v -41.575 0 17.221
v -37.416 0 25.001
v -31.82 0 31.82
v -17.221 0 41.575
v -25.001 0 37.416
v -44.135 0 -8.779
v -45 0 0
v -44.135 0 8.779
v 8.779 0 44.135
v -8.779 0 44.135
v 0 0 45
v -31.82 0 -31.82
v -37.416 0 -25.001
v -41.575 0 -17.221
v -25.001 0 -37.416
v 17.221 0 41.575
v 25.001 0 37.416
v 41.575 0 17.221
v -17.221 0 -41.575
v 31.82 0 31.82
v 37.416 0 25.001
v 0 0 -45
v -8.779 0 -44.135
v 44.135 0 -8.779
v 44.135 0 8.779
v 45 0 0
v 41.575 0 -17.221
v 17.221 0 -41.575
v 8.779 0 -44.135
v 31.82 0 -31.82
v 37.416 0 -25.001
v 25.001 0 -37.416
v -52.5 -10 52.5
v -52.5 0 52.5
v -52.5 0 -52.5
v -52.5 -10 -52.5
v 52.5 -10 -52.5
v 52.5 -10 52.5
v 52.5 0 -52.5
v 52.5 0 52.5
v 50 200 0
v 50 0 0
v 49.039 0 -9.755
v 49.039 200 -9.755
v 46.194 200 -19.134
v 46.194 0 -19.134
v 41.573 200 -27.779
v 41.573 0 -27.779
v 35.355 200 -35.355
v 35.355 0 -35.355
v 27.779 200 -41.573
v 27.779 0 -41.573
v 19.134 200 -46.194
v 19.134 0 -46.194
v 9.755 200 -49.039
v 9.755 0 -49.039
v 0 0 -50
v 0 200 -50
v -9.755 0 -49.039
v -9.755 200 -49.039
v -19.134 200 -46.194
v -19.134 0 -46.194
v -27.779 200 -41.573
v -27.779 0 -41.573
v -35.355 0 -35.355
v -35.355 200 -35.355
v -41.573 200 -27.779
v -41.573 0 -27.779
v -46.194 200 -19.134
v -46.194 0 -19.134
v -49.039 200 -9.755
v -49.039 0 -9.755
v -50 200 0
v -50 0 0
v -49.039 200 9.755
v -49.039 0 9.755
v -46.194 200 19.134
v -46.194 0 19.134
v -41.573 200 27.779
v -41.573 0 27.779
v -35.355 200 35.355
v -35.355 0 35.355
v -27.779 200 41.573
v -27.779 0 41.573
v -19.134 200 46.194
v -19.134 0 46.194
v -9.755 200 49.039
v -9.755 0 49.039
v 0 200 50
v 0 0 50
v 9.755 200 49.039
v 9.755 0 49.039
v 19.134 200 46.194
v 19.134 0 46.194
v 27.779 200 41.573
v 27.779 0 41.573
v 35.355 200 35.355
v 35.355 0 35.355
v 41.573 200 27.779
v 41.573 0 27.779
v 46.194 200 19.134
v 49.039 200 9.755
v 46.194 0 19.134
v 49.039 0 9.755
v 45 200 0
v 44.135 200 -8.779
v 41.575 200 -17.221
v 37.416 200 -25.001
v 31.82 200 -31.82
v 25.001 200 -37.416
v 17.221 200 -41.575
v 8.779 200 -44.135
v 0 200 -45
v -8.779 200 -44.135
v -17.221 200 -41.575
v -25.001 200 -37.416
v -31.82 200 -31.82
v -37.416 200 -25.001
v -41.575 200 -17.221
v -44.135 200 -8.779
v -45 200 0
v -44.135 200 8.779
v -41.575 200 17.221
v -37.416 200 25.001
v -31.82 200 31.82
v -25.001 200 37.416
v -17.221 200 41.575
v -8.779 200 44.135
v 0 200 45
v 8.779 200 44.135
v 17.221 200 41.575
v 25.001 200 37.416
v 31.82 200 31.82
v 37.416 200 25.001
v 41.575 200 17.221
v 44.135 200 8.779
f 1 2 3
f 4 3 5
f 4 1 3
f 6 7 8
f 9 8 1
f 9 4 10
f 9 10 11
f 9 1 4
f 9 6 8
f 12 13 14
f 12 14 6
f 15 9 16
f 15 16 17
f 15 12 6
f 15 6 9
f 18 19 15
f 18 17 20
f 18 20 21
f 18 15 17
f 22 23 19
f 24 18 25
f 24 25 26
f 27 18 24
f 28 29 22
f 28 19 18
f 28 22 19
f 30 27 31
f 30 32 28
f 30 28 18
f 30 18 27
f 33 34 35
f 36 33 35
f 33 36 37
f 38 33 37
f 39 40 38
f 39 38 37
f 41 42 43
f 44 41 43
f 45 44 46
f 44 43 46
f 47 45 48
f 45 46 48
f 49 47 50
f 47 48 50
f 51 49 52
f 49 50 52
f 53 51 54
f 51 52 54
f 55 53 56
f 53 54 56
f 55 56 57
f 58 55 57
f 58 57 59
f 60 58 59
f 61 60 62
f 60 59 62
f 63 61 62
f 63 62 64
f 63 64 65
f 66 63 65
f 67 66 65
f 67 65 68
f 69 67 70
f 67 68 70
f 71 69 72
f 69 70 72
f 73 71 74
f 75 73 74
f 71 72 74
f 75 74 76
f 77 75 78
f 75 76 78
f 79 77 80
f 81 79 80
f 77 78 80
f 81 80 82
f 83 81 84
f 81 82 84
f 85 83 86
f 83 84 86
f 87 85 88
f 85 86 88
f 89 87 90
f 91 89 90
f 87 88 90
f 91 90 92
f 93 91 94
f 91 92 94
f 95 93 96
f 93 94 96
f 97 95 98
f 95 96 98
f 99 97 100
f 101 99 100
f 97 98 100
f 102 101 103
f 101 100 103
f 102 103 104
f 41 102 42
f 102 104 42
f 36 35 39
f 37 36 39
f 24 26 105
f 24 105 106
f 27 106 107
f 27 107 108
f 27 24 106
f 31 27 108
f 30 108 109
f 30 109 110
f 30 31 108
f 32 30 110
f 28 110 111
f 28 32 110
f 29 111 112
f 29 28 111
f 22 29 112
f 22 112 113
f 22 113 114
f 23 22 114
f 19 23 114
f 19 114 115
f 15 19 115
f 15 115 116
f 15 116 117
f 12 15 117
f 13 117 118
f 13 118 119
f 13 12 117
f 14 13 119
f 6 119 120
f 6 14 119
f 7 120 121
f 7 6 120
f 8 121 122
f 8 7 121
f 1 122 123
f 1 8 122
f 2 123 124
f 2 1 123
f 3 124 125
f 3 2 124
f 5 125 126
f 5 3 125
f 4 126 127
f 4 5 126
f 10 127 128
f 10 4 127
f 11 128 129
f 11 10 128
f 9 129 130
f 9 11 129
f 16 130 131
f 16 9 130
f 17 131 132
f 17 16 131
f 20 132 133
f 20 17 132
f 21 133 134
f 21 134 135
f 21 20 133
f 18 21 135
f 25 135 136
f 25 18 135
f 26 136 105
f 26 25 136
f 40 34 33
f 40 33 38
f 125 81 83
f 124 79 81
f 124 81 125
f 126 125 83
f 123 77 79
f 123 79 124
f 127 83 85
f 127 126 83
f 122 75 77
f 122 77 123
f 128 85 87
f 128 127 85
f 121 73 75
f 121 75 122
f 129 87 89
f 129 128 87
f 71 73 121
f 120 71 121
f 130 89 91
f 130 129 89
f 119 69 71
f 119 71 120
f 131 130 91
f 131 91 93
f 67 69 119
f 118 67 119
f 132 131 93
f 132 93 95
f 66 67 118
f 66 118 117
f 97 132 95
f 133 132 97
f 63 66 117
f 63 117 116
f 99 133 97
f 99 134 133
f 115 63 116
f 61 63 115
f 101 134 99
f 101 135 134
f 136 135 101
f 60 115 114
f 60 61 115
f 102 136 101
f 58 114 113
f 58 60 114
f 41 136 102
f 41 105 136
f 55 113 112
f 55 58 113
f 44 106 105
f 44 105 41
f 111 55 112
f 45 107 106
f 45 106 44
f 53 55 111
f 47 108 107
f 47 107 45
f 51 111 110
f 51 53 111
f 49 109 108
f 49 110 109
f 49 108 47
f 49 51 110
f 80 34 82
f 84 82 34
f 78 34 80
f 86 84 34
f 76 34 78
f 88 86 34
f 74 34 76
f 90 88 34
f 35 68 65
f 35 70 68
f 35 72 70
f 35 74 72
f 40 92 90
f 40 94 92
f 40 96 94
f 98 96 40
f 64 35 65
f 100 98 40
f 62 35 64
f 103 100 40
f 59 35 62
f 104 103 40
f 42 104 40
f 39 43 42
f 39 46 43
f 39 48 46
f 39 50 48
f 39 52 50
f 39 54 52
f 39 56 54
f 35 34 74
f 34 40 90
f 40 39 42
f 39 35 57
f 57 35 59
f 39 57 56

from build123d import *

# Parameters (mm, degrees)
SKETCH2_R           = 50
SKETCH2_R_2         = 45
BOSS_EXTRUDE3_DEPTH = 200
SKETCH4_W           = 105
SKETCH4_H           = 105
BOSS_EXTRUDE5_DEPTH = 10


with BuildPart() as part:
    # Sketch2 → Boss-Extrude3 (new body)
    with BuildSketch(Plane(origin=(0, 0, 0), x_dir=(1, 0, 0), z_dir=(0, 1, 0))):
        Circle(SKETCH2_R)
        Circle(SKETCH2_R_2, mode=Mode.SUBTRACT)
    extrude(amount=BOSS_EXTRUDE3_DEPTH)

    # Sketch4 → Boss-Extrude5 (add)
    with BuildSketch(Plane(origin=(0, 0, 0), x_dir=(1, 0, 0), z_dir=(0, 1, 0))):
        Rectangle(SKETCH4_W, SKETCH4_H)
    extrude(amount=-BOSS_EXTRUDE5_DEPTH)


solid = part.part
